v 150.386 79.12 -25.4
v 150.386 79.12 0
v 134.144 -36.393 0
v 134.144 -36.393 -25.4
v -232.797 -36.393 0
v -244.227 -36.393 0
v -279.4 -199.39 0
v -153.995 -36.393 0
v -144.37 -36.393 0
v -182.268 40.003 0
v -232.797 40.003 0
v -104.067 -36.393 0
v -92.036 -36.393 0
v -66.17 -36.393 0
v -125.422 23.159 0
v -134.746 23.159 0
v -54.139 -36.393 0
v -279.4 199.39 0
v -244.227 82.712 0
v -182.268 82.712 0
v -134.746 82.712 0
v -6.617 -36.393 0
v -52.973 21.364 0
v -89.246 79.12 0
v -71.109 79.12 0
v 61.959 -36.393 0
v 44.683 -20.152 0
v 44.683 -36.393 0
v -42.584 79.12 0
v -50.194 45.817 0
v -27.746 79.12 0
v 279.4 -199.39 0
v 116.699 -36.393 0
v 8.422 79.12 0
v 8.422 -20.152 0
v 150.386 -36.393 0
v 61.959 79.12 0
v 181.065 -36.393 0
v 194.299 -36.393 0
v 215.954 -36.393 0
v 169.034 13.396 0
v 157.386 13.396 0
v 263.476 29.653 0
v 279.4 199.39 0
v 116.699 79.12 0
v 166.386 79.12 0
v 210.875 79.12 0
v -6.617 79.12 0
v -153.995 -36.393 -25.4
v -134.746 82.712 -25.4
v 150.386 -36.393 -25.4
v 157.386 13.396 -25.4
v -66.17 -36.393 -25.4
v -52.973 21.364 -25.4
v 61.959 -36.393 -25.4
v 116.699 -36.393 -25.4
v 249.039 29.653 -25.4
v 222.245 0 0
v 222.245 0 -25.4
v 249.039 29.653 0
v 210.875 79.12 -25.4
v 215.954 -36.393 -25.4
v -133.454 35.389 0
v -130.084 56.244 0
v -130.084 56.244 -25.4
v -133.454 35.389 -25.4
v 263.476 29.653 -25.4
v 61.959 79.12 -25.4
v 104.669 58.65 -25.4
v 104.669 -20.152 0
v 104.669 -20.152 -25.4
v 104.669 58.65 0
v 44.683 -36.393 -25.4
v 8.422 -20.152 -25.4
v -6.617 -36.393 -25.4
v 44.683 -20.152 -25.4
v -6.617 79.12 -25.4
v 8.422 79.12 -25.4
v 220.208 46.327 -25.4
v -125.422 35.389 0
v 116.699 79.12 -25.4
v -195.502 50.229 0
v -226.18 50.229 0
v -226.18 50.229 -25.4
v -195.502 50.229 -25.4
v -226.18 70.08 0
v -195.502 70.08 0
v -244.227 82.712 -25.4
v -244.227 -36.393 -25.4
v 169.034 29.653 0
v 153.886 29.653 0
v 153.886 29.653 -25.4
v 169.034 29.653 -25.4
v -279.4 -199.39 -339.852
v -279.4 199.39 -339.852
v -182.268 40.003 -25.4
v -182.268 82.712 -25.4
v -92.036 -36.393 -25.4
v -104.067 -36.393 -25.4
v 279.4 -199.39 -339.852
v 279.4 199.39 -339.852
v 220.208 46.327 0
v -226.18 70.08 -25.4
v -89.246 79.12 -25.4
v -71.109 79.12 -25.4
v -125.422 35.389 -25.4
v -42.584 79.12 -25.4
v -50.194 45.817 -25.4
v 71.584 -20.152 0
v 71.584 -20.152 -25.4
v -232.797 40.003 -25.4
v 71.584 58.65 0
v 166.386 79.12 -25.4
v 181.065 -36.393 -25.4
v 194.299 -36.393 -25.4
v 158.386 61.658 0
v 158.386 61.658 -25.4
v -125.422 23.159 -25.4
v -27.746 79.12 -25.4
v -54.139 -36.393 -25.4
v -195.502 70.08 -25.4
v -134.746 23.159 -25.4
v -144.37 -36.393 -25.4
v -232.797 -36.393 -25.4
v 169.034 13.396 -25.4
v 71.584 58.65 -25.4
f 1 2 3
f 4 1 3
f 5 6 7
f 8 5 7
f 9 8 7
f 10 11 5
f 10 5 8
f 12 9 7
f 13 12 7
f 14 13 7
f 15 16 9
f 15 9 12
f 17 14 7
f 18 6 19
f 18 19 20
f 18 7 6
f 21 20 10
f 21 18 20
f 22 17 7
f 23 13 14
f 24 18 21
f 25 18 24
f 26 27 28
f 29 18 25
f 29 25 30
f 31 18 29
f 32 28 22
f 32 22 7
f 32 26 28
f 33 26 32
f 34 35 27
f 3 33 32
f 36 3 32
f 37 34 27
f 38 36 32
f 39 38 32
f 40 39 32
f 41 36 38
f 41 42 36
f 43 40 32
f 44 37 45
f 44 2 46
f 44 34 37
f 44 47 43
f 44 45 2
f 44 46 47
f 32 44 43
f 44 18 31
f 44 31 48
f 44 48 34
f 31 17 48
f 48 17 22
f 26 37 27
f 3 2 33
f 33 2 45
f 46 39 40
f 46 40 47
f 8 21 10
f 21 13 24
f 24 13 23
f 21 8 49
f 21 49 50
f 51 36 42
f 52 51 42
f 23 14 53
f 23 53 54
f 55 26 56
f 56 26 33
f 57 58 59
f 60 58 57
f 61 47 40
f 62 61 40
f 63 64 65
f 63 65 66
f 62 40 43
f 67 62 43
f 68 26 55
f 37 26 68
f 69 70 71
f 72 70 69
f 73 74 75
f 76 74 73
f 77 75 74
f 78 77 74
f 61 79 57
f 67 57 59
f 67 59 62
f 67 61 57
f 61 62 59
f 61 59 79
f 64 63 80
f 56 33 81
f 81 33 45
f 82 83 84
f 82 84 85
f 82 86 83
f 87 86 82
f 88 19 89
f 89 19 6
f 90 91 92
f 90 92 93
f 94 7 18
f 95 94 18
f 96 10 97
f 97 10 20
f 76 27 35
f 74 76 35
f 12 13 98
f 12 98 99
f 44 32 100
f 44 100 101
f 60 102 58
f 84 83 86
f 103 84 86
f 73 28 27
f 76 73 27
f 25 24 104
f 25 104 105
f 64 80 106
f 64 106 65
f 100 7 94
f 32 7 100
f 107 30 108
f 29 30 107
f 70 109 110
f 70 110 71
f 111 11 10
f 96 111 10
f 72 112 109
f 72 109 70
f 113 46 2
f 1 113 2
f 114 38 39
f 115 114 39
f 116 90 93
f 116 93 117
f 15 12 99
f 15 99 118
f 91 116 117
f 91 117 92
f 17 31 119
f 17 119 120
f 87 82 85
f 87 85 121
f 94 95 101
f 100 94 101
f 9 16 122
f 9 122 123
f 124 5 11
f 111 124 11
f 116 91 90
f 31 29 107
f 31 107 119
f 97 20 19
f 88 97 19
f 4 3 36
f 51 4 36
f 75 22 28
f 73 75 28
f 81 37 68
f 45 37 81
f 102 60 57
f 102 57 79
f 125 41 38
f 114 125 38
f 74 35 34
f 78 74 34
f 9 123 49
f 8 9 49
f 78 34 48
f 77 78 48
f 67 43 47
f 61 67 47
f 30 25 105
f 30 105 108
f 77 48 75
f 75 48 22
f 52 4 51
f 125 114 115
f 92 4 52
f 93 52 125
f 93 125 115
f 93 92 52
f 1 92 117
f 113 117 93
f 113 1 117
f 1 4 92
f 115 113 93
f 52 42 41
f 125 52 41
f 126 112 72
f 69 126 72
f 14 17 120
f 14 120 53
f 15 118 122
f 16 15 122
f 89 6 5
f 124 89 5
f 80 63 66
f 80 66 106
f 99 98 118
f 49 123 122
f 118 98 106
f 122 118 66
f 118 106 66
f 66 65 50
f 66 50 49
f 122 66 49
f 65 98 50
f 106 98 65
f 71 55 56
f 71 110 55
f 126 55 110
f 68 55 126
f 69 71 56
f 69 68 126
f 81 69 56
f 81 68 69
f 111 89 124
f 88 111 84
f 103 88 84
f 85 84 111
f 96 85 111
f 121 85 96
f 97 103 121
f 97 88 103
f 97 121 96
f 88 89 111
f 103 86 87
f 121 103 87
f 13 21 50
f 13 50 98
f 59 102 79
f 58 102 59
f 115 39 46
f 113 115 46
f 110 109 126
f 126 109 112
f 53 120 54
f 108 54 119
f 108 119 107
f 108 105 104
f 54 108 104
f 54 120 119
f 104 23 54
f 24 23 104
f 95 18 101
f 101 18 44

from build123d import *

# Parameters (mm, degrees)
SKETCH1_W           = 558.8
SKETCH1_H           = 398.78
BOSS_EXTRUDE1_DEPTH = 339.852
SKETCH2_W           = 30.678718516
SKETCH2_H           = 19.85093551
SKETCH2_W_2         = 54.740458529
SKETCH2_H_2         = 115.513846454
SKETCH2_W_3         = 33.084892517
SKETCH2_H_3         = 78.80219854
CUT_EXTRUDE1_DEPTH  = 25.4


with BuildPart() as part:
    # Sketch1 → Boss-Extrude1 (new body)
    with BuildSketch(Plane.XY):
        Rectangle(SKETCH1_W, SKETCH1_H)
    extrude(amount=-BOSS_EXTRUDE1_DEPTH)

    # Sketch2 → Cut-Extrude1 (cut)
    # profile 1 of 7: a face of its own
    with BuildSketch(Plane.XY):
        Polygon((-244.226661127, 82.712231293), (-244.226661127, -36.393381769), (-232.797334621, -36.393381769), (-232.797334621, 40.002642771), (-182.267680595, 40.002642771), (-182.267680595, 82.712231293), align=None)
        with Locations((-210.840996859, 60.154350031)):
            Rectangle(SKETCH2_W, SKETCH2_H, mode=Mode.SUBTRACT)
    # profile 2 of 7: a face of its own
    with BuildSketch(Plane.XY):
        Polygon((-153.99513608, -36.393381769), (-134.74574407, 82.712231293), (-92.036155548, -36.393381769), (-104.067025554, -36.393381769), (-125.421819815, 23.159424762), (-134.74574407, 23.159424762), (-144.370440075, -36.393381769), align=None)
        Polygon((-130.083781942, 56.244317279), (-133.454387424, 35.388695861), (-125.421819815, 35.388695861), align=None, mode=Mode.SUBTRACT)
    # profile 3 of 7: a face of its own
    with BuildSketch(Plane.XY):
        Polygon((-27.74569837, 79.120464685), (-54.138915028, -36.393381769), (-66.169785034, -36.393381769), (-52.973176705, 21.363541458), (-89.245743132, 79.120464685), (-71.109459919, 79.120464685), (-50.193871527, 45.81650657), (-42.584406436, 79.120464685), align=None)
    # profile 4 of 7: a face of its own
    with BuildSketch(Plane.XY):
        Polygon((-6.616978503, 79.120464685), (-6.616978503, -36.393381769), (44.683403133, -36.393381769), (44.683403133, -20.15170726), (8.421609004, -20.15170726), (8.421609004, 79.120464685), align=None)
    # profile 5 of 7: a face of its own
    with BuildSketch(Plane.XY):
        with Locations((89.329209797, 21.363541458)):
            Rectangle(SKETCH2_W_2, SKETCH2_H_2)
        with Locations((88.126122796, 19.24939201)):
            Rectangle(SKETCH2_W_3, SKETCH2_H_3, mode=Mode.SUBTRACT)
    # profile 6 of 7: a face of its own
    with BuildSketch(Plane.XY):
        Polygon((150.385875078, 79.120464685), (134.14420057, -36.393381769), (150.385875078, -36.393381769), (157.386476137, 13.396210762), (169.033723588, 13.396210762), (181.064593594, -36.393381769), (194.298550601, -36.393381769), (166.386450903, 79.120464685), align=None)
        Polygon((158.386162991, 61.658208782), (153.886175607, 29.653451429), (169.033723588, 29.653451429), align=None, mode=Mode.SUBTRACT)
    # profile 7 of 7: a face of its own
    with BuildSketch(Plane.XY):
        Polygon((210.874736117, 79.120464685), (215.954116612, -36.393381769), (263.476053137, 29.653451429), align=None)
        Polygon((220.207882974, 46.326740486), (222.244964668, 0), (249.039009129, 29.653451429), align=None, mode=Mode.SUBTRACT)
    extrude(amount=-CUT_EXTRUDE1_DEPTH, mode=Mode.SUBTRACT)


solid = part.part
